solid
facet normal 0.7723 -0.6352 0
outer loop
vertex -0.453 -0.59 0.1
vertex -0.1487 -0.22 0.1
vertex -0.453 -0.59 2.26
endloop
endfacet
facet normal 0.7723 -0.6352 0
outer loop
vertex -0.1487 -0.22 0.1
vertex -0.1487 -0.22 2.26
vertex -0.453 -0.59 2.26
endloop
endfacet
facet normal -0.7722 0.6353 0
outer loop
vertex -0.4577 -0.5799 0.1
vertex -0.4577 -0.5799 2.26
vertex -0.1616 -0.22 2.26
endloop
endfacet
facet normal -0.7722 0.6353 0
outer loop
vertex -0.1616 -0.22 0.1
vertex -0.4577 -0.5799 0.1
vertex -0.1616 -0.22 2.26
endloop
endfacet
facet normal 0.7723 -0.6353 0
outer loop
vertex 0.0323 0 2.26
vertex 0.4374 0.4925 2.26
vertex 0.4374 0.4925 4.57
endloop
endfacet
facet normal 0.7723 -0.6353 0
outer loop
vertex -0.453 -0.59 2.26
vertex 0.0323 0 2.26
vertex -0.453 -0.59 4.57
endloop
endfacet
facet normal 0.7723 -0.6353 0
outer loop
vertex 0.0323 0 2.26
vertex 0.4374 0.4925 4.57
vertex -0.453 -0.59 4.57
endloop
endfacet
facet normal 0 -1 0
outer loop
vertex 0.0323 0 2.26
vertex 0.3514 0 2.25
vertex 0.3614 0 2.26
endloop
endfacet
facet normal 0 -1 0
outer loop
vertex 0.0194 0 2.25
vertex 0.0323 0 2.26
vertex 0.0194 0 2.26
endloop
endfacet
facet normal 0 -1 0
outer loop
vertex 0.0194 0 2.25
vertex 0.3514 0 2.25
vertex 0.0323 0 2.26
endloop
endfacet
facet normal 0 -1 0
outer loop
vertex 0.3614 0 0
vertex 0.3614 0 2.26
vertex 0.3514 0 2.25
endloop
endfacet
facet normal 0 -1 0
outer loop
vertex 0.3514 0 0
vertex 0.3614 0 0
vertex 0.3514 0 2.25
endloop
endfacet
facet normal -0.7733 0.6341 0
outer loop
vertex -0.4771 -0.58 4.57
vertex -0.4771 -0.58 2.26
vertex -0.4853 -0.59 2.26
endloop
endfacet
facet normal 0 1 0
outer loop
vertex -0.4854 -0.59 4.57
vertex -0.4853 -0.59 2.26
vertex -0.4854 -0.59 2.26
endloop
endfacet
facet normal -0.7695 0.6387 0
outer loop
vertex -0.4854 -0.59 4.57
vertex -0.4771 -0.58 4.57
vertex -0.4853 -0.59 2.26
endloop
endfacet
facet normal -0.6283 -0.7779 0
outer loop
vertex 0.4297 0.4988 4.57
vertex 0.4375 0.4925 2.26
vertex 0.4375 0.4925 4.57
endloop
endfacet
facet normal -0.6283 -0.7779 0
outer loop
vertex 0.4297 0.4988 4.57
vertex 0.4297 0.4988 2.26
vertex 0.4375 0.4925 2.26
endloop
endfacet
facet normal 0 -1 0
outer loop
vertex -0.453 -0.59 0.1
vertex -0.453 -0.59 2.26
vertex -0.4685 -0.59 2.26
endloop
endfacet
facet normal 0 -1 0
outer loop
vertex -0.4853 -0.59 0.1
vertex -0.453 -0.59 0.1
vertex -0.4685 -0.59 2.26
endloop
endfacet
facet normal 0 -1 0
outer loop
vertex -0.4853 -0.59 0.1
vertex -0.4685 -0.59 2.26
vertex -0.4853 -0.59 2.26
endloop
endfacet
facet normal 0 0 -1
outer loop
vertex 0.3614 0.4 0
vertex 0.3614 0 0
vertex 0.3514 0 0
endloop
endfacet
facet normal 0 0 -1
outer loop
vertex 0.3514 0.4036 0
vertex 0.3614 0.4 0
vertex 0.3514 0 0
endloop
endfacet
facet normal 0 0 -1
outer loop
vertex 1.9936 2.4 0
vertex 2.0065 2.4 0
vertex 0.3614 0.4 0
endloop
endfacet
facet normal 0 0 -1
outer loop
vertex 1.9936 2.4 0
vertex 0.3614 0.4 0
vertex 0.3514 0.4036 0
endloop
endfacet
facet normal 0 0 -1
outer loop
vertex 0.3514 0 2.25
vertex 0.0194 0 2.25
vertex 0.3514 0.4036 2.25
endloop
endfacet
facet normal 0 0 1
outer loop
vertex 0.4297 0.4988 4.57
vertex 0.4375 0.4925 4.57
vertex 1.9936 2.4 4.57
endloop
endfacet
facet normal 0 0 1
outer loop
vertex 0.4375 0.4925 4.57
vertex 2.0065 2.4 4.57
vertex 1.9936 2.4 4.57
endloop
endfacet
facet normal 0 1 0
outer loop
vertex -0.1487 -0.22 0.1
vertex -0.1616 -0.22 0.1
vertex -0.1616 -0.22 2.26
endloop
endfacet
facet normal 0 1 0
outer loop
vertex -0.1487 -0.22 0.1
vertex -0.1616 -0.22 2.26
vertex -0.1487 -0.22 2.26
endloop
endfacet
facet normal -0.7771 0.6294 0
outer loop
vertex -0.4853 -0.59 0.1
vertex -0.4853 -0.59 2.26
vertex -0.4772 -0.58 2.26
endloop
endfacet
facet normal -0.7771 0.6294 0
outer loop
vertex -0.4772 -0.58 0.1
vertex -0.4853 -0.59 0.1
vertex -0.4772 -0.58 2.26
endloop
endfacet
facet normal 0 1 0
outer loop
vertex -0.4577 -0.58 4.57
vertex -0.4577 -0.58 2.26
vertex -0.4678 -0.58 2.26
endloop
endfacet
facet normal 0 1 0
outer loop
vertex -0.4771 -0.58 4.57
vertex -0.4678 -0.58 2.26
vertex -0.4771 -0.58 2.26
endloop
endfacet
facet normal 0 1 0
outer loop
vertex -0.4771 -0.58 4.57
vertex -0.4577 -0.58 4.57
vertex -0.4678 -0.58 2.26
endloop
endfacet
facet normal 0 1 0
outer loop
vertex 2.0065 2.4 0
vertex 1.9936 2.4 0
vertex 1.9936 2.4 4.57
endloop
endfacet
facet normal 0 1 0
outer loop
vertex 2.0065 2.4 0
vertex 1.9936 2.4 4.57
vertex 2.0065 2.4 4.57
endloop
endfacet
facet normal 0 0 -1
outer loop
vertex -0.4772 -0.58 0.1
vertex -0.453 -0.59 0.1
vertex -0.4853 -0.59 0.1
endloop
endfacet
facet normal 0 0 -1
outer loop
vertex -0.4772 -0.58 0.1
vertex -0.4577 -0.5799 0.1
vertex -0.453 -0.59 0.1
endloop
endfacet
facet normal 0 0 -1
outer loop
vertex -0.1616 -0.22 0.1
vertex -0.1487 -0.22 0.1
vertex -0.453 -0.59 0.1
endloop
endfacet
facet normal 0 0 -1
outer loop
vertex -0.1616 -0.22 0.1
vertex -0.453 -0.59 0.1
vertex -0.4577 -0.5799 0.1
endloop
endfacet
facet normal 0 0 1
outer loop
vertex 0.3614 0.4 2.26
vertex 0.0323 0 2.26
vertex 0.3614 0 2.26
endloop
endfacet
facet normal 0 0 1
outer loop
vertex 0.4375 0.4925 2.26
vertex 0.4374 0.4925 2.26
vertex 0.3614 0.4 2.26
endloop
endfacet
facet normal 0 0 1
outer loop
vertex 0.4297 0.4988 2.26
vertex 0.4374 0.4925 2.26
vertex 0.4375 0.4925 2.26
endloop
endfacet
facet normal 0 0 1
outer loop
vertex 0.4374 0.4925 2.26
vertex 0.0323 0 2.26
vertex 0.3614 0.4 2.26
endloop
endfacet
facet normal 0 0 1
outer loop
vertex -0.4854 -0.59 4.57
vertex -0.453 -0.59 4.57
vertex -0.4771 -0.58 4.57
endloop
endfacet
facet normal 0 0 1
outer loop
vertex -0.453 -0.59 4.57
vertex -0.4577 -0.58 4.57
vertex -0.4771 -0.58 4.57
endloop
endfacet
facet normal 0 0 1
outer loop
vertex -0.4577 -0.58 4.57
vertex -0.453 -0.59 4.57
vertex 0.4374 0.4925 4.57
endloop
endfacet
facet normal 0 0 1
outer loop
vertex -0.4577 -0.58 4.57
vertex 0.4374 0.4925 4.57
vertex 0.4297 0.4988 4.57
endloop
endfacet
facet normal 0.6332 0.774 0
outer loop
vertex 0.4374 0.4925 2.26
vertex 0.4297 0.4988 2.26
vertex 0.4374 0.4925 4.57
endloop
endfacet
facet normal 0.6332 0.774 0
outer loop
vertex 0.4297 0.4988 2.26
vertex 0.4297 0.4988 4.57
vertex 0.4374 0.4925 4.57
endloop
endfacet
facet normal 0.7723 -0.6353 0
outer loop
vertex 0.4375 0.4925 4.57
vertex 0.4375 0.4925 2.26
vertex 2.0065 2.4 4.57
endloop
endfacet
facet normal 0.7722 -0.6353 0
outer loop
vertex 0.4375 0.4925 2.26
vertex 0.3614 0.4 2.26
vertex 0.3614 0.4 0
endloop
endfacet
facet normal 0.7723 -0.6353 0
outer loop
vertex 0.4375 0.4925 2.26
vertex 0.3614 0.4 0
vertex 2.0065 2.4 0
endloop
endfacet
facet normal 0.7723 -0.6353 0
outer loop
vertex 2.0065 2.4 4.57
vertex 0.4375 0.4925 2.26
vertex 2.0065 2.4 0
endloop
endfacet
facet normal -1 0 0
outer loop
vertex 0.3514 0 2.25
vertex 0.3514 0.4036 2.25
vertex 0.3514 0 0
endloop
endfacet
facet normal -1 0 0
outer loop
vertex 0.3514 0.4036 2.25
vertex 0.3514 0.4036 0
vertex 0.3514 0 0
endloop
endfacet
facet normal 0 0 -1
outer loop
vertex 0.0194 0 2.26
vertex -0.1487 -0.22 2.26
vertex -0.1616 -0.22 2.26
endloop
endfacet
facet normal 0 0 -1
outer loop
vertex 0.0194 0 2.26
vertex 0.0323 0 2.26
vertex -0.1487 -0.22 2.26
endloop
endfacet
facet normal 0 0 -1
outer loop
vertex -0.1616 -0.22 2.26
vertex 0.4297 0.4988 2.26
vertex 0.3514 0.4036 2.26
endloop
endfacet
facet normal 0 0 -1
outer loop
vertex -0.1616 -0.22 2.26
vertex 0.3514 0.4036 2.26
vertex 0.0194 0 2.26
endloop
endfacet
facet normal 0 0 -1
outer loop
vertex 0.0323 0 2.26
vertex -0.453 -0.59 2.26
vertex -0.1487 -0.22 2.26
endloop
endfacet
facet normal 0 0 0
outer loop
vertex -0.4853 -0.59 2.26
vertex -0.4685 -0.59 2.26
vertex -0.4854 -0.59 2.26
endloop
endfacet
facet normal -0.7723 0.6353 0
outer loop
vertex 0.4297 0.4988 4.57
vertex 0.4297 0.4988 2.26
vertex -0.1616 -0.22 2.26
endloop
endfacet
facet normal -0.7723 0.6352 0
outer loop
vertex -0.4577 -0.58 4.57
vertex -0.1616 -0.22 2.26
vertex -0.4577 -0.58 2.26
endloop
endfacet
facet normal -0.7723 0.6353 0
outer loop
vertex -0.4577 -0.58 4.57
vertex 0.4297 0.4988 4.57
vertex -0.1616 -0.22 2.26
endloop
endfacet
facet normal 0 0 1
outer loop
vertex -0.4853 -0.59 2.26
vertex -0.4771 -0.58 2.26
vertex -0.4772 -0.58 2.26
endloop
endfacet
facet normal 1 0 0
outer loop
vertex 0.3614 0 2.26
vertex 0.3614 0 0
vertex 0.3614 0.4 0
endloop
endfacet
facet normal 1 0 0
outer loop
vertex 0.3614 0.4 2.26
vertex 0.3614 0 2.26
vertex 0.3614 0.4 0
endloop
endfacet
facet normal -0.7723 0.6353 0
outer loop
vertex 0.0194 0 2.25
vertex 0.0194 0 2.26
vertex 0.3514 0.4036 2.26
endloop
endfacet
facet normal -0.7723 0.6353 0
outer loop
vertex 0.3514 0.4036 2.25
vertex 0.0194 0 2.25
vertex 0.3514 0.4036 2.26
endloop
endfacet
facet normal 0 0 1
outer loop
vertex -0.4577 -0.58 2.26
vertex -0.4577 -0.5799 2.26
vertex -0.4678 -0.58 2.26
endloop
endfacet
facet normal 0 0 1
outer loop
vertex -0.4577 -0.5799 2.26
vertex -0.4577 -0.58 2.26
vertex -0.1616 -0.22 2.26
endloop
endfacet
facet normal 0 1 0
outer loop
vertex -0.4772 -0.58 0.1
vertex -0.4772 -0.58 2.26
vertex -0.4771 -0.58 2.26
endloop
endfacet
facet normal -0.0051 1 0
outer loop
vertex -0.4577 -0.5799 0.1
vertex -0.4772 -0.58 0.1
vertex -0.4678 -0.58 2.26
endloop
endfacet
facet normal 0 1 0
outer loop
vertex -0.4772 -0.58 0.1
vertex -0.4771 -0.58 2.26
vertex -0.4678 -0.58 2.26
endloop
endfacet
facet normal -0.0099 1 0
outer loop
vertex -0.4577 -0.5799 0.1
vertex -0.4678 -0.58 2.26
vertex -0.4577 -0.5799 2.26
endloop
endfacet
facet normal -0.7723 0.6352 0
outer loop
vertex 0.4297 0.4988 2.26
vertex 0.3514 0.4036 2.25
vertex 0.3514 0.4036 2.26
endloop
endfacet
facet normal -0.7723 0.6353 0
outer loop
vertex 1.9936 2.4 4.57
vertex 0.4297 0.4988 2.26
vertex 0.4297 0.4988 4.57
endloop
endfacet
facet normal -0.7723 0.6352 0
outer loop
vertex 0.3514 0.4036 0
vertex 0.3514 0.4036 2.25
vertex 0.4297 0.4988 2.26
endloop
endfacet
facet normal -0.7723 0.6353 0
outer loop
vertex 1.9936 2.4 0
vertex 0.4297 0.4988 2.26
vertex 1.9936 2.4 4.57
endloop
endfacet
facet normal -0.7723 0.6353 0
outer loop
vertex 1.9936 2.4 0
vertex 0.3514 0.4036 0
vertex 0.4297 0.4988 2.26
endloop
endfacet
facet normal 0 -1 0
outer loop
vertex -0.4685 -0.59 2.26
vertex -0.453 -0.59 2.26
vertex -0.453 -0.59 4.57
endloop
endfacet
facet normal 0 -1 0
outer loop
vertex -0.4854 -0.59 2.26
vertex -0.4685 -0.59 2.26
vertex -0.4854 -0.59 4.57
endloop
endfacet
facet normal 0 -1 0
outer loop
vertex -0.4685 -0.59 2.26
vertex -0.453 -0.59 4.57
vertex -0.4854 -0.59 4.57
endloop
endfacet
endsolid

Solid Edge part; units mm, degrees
sketch "Sketch1" plane through (0, 0, 0) normal (0, 0, 1) x (1, 0, 0)
  line L0 (0.3514, 0.4036) -> (1.9936, 2.4)
  line L1 (1.9936, 2.4) -> (2.0065, 2.4)
  line L2 (0.3614, 0.4) -> (2.0065, 2.4)
  line L3 (0.3614, 0) -> (0.3614, 0.4)
  line L4 (0.3614, 0) -> (0.3514, 0)
  line L5 (0.3514, 0.4036) -> (0.3514, 0)
  dimension "D1" = 0.3614
extrude "Protrusion1" add sketch "Sketch1" along normal blind 4.57
sketch "Sketch2" plane through (1.1725, 1.4018, 2.325) normal (-0.7723, 0.6353, 0) x (0, 0, 1)
  line L0 (-0.065, -1.8274) -> (-0.065, -1.1692)
  line L1 (-0.065, -1.1692) -> (2.7493, -1.1692)
  line L2 (2.7493, -1.1692) -> (2.7493, -1.8274)
  line L3 (-0.065, -1.8274) -> (2.7493, -1.8274)
extrude "Cutout1" cut sketch "Sketch2" against normal through all
sketch "Sketch3" plane through (1.2181, 1.4462, 4.57) normal (0, 0, 1) x (0.6353, 0.7723, 0)
  line L0 (-1.2325, -0.003) -> (-2.6341, -0.003)
  line L1 (-2.6341, -0.003) -> (-2.6547, 0.022)
  line L2 (-2.6417, 0.022) -> (-2.6547, 0.022)
  line L3 (-2.6294, 0.007) -> (-2.6417, 0.022)
  line L4 (-1.2325, 0.007) -> (-2.6294, 0.007)
  line L5 (-1.2325, 0.007) -> (-1.2325, -0.003)
extrude "Protrusion2" add sketch "Sketch3" against normal up to surface (2.31 mm away)
sketch "Sketch4" plane through (-0.067, -0.0932, 2.26) normal (0, 0, -1) x (0.6353, 0.7723, 0)
  line L0 (-0.158, 0.0075) -> (-0.1498, 0.0175)
  line L1 (-0.1498, 0.0175) -> (-0.6289, 0.0175)
  line L2 (-0.6289, 0.0175) -> (-0.6494, -0.0075)
  line L3 (-0.6494, -0.0075) -> (-0.6365, -0.0075)
  line L4 (-0.6365, -0.0075) -> (-0.6241, 0.0075)
  line L5 (-0.6241, 0.0075) -> (-0.158, 0.0075)
extrude "Ausprägung_3" add sketch "Sketch4" along normal blind 2.16
sketch "Sketch5" plane through (0.3564, 0.2, 2.26) normal (0, 0, 1) x (0, 1, 0)
  line L0 (-0.2, 0.337) -> (-0.2, 0.005)
  line L1 (0.2036, 0.005) -> (-0.2, 0.005)
  line L2 (-0.2, 0.337) -> (0.2036, 0.005)
extrude "Ausprägung_4" add sketch "Sketch5" against normal blind 0.01
